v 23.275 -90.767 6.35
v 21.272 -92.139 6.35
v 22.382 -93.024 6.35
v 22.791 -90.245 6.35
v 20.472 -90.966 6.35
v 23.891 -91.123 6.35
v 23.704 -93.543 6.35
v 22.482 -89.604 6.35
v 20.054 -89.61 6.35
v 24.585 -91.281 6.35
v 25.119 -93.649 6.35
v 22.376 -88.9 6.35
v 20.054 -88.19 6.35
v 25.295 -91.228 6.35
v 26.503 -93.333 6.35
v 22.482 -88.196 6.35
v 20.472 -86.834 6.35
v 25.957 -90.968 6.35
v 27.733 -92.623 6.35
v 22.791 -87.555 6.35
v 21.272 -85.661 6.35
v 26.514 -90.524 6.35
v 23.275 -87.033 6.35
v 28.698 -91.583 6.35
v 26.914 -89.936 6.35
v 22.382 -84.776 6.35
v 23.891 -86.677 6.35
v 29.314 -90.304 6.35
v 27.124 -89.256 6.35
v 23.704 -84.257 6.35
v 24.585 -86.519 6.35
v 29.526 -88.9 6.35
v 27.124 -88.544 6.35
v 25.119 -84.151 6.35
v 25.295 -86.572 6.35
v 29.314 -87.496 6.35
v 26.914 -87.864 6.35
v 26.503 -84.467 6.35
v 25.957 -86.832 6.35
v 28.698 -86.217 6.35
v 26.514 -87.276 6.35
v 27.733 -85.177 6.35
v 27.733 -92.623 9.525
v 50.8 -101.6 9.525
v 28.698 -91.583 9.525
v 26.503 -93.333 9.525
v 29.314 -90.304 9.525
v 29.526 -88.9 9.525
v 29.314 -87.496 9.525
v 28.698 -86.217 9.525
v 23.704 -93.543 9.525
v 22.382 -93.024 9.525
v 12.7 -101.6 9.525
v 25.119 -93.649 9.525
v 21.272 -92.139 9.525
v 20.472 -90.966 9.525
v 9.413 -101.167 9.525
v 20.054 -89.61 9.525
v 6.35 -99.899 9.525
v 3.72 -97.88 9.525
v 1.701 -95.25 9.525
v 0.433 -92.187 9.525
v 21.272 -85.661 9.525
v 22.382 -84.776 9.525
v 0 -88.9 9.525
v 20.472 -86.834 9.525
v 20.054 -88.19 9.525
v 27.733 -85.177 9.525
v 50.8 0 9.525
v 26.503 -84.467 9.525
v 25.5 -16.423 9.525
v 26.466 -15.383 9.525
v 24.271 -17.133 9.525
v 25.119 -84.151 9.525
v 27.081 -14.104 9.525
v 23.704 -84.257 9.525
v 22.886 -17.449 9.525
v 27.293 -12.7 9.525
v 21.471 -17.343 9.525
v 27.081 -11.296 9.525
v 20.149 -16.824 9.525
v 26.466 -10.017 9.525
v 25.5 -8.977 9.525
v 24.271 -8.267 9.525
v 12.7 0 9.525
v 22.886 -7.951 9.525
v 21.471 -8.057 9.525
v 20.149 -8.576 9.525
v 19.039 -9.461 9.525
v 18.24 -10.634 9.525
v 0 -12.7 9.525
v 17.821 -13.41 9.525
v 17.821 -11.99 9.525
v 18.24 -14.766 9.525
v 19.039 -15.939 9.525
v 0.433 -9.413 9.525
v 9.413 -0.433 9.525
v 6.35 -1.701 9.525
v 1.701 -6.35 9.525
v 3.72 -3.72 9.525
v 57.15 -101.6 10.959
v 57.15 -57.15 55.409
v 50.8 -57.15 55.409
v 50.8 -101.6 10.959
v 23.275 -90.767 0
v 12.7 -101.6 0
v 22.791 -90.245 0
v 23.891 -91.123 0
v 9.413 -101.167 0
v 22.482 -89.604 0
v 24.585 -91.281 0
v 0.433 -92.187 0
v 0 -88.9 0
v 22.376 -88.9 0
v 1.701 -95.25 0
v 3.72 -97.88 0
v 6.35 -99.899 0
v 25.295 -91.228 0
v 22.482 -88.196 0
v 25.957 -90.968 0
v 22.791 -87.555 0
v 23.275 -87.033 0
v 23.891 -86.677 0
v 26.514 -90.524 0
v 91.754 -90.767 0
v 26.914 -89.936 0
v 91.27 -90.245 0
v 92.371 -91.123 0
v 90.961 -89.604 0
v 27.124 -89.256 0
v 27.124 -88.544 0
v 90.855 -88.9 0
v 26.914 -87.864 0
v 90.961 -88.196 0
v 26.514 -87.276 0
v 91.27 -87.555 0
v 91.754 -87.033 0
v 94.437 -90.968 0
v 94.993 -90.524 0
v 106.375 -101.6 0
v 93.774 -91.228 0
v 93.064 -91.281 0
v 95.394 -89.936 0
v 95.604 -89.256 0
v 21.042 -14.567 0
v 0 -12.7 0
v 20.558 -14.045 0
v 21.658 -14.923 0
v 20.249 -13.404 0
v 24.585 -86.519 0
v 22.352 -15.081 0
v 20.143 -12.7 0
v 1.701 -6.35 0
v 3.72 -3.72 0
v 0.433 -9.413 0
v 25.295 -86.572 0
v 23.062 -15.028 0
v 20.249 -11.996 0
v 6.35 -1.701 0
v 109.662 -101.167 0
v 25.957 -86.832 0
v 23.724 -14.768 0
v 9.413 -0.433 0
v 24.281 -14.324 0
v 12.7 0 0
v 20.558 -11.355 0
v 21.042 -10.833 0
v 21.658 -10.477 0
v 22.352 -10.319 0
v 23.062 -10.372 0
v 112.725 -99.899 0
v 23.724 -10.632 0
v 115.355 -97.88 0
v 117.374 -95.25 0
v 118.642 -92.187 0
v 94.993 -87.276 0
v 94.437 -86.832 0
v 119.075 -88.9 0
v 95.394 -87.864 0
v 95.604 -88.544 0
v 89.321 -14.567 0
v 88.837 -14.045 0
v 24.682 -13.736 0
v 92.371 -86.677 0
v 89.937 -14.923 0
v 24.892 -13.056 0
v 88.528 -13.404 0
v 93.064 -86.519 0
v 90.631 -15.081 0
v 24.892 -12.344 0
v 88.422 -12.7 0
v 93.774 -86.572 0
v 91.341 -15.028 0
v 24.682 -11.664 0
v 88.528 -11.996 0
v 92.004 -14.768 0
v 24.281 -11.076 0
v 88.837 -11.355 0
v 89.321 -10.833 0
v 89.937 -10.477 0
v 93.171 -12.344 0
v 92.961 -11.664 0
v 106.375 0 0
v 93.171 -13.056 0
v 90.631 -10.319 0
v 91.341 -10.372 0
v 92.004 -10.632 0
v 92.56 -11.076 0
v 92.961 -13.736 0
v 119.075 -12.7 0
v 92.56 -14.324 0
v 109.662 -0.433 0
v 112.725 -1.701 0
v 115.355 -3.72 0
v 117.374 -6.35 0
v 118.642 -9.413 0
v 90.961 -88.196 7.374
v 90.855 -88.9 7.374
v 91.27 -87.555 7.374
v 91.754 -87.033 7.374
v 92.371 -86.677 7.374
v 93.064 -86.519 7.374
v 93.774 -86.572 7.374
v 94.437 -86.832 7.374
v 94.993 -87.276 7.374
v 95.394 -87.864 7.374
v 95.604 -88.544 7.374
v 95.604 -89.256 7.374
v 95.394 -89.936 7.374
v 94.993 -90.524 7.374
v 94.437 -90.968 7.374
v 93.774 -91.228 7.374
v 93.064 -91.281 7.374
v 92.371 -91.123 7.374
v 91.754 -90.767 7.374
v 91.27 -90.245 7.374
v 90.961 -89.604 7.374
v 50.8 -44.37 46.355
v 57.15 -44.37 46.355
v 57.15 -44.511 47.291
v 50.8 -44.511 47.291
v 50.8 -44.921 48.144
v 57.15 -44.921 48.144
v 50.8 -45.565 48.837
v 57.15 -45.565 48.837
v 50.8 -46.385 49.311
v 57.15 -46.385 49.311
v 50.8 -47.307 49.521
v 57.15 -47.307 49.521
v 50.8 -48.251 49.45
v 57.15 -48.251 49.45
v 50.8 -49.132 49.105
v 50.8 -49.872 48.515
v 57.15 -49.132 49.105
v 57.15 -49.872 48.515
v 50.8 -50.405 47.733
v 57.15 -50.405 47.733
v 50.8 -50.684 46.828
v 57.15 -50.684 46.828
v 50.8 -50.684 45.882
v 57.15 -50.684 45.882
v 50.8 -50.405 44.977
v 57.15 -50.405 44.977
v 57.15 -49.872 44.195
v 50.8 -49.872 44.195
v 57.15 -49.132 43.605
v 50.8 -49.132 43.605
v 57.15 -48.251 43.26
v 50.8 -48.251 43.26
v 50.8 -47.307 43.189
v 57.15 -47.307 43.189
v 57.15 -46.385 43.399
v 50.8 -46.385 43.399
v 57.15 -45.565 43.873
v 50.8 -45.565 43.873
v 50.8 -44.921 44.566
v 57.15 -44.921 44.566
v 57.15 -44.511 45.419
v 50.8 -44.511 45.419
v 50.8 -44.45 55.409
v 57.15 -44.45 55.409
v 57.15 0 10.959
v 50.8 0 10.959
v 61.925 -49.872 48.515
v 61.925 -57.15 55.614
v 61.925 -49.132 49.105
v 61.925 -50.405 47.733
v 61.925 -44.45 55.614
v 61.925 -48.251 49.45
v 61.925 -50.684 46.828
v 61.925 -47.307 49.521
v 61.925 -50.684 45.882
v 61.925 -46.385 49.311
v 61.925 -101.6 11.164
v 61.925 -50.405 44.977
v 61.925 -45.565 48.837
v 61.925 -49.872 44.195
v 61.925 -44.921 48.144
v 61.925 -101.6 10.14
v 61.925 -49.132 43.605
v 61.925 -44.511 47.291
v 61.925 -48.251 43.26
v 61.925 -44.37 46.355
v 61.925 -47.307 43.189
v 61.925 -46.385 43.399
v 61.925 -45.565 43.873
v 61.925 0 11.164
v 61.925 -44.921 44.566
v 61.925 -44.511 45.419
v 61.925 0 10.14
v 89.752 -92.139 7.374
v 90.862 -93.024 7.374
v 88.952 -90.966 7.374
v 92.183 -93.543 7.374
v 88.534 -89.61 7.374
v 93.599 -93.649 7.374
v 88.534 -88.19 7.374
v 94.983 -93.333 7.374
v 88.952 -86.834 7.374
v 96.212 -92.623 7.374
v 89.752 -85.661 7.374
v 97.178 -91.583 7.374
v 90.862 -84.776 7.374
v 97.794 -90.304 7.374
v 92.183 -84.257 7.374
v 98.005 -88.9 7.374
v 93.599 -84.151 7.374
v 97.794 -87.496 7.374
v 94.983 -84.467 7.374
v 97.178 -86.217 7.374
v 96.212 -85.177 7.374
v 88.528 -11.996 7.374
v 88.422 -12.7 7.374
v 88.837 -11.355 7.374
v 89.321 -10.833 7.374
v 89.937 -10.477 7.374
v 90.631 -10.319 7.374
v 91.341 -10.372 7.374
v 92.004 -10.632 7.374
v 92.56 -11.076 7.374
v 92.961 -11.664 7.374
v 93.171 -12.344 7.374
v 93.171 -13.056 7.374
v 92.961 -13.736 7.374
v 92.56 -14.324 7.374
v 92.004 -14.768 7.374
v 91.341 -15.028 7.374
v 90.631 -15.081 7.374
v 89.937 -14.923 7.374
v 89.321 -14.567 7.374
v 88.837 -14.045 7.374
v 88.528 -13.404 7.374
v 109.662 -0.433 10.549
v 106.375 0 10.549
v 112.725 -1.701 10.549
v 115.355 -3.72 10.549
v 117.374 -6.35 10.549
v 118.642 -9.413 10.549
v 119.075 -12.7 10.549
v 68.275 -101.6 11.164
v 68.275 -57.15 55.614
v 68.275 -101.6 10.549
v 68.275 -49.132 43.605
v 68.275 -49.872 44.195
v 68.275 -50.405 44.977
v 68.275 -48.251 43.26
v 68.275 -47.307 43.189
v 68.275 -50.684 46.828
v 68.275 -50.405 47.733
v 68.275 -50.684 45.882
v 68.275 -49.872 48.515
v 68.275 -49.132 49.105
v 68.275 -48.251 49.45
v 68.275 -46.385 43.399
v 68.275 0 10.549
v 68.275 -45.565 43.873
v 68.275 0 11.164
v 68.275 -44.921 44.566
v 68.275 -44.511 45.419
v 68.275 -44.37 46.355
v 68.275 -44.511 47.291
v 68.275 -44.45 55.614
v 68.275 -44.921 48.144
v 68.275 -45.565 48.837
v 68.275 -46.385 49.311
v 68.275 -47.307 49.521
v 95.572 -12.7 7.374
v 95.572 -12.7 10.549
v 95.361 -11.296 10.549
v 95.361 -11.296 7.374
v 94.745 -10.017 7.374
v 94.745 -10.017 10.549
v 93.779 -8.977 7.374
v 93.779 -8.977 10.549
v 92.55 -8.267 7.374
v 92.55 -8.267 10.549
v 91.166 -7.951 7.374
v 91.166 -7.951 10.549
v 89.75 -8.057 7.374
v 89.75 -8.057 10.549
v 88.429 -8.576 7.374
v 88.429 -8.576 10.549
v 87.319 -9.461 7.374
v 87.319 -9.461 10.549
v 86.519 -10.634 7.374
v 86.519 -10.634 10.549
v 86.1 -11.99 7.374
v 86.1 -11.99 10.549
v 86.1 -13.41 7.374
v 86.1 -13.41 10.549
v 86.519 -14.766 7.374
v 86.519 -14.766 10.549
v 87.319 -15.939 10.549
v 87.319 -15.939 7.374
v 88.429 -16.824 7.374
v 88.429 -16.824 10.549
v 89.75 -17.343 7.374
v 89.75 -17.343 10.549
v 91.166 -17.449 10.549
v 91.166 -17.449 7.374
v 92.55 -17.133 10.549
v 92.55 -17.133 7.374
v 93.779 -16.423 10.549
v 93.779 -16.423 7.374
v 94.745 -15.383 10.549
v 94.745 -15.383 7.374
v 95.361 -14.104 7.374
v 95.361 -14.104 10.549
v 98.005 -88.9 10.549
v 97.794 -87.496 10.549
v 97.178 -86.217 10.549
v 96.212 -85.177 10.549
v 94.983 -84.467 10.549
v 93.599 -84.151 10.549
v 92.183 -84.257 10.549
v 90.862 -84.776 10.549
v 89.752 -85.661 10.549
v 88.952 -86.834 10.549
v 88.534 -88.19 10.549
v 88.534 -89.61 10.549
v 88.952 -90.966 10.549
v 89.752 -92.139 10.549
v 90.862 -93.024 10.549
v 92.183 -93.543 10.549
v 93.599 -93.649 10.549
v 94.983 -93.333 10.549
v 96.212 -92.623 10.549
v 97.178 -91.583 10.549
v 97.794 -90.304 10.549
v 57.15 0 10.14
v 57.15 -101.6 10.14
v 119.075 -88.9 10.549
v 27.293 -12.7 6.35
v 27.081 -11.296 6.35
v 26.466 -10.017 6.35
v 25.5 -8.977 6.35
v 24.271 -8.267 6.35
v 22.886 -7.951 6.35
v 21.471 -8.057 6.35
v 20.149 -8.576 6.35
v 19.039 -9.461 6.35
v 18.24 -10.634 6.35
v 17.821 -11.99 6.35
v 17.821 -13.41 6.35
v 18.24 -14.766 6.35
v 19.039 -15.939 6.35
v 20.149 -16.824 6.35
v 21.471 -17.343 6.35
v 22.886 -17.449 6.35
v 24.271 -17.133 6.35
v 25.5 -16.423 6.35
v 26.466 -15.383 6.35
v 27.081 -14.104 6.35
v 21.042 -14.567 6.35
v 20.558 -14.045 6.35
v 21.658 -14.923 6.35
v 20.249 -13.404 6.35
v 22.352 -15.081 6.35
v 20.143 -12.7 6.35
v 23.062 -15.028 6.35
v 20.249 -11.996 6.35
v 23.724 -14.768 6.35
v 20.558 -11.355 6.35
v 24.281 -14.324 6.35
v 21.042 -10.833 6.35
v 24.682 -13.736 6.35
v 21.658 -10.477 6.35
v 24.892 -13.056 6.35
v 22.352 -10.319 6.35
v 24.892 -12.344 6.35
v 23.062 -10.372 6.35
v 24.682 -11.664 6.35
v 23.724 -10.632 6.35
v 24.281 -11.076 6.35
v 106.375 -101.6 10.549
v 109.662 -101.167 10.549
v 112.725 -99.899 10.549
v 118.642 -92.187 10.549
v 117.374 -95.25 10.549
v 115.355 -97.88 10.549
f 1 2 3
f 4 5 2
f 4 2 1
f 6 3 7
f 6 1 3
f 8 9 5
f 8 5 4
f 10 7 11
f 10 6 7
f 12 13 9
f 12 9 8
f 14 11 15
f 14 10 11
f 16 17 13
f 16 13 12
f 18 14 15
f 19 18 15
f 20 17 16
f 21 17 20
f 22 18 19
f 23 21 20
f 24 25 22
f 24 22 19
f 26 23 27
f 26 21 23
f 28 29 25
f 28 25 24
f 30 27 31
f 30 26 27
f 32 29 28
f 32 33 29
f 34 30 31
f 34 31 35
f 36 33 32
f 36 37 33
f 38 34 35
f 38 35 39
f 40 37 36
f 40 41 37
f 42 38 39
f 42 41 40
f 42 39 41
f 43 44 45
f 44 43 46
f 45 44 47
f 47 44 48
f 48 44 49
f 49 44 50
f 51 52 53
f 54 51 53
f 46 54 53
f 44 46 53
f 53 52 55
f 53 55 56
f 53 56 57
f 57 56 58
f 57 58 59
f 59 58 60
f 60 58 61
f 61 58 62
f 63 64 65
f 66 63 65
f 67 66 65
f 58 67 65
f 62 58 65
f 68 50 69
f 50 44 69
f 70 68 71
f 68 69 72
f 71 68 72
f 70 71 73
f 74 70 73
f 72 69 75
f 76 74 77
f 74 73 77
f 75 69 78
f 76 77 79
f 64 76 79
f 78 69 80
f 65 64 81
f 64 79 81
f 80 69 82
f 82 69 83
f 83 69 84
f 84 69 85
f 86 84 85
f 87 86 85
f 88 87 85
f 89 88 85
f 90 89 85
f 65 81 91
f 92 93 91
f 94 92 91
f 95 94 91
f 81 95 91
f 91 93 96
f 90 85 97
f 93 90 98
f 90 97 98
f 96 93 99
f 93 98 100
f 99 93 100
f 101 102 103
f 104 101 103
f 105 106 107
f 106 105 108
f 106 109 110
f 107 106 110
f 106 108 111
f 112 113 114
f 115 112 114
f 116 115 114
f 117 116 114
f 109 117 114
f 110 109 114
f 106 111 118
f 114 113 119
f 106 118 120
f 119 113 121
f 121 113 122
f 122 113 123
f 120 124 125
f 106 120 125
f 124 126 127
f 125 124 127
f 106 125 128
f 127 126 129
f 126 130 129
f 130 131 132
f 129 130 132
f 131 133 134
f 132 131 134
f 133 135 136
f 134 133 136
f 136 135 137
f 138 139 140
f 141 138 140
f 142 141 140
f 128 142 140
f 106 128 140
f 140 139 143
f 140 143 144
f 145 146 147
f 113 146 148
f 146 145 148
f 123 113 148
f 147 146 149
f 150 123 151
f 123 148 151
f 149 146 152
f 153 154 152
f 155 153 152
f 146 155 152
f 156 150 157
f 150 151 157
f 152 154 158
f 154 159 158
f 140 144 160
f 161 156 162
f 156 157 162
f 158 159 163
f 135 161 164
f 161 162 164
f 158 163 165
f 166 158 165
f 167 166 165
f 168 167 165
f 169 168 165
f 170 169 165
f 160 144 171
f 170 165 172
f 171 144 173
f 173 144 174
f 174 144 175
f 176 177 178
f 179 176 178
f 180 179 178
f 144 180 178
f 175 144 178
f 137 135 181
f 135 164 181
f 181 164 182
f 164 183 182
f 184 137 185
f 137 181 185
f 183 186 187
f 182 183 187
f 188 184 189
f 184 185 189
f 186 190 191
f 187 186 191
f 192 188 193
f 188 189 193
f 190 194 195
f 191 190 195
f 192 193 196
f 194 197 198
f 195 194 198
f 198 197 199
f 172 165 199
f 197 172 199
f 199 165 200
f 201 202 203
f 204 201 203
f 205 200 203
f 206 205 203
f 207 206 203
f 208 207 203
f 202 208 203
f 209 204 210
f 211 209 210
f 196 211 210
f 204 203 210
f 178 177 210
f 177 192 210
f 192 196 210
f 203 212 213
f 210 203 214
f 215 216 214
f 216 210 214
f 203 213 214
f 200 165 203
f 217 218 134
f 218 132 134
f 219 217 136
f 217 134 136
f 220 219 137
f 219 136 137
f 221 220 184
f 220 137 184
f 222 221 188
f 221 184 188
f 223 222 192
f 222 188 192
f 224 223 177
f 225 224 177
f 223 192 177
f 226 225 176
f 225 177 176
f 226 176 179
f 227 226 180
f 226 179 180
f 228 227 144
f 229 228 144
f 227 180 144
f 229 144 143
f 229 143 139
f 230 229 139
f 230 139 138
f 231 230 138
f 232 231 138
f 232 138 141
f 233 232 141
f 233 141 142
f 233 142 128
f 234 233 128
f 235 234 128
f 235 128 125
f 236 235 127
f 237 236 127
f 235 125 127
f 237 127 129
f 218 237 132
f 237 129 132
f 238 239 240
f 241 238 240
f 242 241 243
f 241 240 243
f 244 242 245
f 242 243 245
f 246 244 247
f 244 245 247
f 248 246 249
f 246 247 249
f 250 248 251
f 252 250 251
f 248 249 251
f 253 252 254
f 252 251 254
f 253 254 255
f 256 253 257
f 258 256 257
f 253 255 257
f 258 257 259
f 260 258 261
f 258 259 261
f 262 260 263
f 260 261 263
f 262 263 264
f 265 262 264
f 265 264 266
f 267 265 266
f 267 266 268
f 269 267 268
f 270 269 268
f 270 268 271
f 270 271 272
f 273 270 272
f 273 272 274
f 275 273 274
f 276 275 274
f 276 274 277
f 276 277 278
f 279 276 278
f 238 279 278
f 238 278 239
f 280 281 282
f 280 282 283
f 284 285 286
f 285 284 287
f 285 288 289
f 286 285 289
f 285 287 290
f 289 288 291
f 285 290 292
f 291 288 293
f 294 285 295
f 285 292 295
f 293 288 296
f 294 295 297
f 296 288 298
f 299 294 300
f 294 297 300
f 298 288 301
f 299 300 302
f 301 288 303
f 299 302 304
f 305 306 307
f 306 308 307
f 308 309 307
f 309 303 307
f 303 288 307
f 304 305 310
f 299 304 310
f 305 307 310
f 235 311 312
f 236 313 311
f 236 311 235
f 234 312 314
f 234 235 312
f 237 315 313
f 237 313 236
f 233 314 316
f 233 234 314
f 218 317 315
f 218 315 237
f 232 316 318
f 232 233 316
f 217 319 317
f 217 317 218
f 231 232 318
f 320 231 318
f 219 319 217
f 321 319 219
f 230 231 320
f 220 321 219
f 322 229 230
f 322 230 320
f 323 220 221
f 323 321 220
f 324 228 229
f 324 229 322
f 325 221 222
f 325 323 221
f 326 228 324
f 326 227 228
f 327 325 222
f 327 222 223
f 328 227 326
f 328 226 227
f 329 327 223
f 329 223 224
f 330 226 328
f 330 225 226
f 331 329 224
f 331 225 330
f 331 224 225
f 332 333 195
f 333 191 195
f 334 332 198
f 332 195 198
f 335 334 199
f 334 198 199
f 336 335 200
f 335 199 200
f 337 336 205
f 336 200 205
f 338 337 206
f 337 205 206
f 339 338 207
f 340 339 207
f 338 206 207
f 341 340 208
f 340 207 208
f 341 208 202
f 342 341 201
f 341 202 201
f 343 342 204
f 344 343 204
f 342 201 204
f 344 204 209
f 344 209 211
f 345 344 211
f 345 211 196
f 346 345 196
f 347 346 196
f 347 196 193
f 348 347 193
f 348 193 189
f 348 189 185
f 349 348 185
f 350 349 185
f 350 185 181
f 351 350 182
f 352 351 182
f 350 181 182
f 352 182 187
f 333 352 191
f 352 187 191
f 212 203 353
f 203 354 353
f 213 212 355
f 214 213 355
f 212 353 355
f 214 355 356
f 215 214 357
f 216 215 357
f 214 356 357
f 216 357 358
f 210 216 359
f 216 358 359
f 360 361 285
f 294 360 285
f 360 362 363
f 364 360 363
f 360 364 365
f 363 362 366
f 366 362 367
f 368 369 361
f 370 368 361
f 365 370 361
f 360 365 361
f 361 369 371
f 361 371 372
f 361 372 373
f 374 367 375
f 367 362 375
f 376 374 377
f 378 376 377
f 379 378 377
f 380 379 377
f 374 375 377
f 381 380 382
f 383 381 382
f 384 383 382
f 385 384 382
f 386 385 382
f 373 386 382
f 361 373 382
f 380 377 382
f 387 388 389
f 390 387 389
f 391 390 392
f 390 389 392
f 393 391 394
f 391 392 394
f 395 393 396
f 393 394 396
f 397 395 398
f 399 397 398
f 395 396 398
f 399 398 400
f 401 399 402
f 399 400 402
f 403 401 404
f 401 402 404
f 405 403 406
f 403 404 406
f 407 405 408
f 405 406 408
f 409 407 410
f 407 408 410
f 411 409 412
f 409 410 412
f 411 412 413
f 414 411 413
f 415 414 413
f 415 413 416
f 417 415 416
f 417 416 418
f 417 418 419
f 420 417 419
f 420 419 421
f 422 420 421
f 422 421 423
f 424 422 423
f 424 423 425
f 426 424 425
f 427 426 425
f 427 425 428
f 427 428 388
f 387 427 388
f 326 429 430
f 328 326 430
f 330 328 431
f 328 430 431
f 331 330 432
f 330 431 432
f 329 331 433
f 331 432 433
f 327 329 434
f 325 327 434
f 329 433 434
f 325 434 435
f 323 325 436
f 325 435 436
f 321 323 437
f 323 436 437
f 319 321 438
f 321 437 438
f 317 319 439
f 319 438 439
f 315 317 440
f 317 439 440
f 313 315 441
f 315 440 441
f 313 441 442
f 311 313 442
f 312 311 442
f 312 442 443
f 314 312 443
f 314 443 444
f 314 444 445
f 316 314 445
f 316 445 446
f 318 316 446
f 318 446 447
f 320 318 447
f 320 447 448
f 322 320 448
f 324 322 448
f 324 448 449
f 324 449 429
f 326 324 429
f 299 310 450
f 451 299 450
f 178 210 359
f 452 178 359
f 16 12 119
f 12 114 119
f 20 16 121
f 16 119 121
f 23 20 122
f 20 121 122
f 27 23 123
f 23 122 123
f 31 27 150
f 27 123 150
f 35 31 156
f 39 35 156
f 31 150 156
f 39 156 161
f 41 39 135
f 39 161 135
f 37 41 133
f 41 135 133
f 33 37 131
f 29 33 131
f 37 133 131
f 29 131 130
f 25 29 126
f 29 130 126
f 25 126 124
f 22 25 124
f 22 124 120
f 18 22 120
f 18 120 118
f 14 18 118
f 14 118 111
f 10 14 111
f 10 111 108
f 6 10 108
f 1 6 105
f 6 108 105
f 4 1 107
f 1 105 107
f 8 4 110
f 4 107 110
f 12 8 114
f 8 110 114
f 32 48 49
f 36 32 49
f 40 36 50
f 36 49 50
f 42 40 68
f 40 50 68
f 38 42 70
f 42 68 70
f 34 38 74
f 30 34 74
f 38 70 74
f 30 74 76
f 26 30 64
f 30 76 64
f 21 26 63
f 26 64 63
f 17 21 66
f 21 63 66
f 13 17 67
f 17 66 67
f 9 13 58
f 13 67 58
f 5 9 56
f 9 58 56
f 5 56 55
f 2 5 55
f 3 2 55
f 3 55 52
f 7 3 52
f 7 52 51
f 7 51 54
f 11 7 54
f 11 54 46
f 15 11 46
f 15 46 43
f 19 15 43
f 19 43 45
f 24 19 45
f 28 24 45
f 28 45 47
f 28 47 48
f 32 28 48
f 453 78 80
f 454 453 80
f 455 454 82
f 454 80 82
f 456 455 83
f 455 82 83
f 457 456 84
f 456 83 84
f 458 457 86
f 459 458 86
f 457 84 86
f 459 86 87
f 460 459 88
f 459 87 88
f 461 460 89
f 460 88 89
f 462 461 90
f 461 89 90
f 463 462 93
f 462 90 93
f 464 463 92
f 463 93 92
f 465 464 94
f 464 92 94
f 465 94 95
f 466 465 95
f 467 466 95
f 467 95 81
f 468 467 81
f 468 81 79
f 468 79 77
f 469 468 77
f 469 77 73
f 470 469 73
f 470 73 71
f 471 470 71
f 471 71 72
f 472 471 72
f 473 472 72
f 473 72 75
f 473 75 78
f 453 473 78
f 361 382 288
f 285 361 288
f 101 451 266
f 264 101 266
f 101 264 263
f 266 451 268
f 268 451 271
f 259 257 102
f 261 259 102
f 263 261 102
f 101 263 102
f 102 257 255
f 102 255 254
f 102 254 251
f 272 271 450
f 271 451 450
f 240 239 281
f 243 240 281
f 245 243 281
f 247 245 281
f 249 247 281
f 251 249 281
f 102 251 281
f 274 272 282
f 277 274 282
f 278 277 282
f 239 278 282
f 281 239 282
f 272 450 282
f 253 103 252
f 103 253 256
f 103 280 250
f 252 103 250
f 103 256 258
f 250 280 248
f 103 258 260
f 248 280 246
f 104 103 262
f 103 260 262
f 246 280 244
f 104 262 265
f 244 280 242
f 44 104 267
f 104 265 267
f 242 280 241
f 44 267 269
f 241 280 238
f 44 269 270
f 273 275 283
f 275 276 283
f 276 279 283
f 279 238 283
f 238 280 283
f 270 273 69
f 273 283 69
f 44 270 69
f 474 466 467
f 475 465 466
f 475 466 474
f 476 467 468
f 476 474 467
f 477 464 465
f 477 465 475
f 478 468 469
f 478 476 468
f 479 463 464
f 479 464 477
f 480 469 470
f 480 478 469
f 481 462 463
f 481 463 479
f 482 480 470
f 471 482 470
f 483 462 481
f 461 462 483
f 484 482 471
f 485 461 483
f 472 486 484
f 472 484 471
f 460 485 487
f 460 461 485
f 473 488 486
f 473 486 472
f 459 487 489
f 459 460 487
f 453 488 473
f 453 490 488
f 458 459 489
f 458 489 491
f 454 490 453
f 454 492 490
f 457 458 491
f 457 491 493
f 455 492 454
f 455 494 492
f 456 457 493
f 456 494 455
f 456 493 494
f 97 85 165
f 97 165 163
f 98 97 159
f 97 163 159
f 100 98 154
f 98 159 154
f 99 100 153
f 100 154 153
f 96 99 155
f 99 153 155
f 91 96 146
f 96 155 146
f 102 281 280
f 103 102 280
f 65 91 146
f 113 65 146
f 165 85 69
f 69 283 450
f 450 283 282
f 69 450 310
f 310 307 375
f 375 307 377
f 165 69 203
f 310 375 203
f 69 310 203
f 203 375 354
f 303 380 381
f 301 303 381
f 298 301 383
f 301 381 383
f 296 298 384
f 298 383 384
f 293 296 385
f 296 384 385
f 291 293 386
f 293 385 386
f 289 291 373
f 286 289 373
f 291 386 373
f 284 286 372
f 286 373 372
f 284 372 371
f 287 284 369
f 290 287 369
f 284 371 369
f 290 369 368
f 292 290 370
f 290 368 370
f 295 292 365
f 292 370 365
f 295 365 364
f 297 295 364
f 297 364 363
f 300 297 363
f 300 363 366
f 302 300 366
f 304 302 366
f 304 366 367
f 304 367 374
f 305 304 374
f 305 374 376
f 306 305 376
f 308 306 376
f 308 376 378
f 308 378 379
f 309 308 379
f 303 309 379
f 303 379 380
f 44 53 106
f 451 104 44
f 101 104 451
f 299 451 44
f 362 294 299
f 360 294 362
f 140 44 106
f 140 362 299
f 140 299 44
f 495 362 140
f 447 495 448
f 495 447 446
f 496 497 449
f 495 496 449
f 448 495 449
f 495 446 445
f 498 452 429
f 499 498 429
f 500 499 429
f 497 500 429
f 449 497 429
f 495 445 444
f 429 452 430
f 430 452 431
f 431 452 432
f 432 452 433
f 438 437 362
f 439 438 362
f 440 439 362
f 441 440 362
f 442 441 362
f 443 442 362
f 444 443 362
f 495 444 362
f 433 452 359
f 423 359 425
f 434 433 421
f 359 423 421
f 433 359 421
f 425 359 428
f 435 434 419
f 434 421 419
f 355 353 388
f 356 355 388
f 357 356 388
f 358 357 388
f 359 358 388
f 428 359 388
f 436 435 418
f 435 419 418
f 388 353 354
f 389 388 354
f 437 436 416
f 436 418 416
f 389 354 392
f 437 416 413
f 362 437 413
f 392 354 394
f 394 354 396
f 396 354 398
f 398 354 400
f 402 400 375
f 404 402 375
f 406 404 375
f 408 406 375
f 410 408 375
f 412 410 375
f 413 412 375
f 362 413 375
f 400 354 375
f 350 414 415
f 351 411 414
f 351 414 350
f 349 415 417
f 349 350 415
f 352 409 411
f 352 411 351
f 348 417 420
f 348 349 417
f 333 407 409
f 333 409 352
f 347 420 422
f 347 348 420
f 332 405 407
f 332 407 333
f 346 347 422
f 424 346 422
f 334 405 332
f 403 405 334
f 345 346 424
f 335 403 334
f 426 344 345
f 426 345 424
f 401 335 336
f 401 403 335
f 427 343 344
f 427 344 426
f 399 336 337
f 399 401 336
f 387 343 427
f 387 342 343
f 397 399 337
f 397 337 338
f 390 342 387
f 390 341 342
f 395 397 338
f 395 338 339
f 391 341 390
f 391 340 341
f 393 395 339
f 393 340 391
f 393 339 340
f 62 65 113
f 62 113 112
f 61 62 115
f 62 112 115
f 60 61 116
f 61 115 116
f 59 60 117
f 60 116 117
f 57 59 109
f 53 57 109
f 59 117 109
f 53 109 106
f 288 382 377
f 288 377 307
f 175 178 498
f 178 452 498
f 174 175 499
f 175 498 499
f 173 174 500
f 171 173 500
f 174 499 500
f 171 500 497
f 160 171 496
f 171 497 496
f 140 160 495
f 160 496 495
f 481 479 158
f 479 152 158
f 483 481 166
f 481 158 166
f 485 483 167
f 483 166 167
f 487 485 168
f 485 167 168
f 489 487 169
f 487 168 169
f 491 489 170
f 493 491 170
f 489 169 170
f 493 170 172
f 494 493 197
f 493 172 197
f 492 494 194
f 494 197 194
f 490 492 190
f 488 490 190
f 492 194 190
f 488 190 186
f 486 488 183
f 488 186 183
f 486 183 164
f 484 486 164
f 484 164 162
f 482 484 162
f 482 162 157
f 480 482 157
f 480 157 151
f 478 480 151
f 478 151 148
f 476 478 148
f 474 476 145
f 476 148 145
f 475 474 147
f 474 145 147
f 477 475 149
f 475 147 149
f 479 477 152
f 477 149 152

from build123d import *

# Parameters (mm, degrees)
F1_DEPTH       = 101.6
F3_D           = 4.7752
F3_CBORE_D     = 9.525
F3_CBORE_DEPTH = 3.175
F5_D           = 4.7752
F5_CBORE_D     = 9.525
F5_CBORE_DEPTH = 3.175
F7_D           = 6.35
F8_SIZE        = 44.45
F9_R           = 12.7


with BuildPart() as f1:
    # F0 (on Front) → F1 (new body)
    with BuildSketch(Plane.XZ):
        Polygon((0, 9.525), (0, 0), (119.0752, 0), (119.0752, 10.549193), (68.2752, 10.549193), (68.2752, 55.613711), (61.9252, 55.613711), (61.9252, 10.139516), (57.15, 10.139516), (57.15, 55.40887), (50.8, 55.40887), (50.8, 9.525), align=None)
    extrude(amount=F1_DEPTH)

    # F3 (through all)
    with Locations(Plane.XY.offset(9.525)):
        with Locations((22.530584, -12.7), (24.763316, -88.9)):
            CounterBoreHole(F3_D / 2, F3_CBORE_D / 2, F3_CBORE_DEPTH)

    # F5 (through all)
    with Locations(Plane.XY.offset(10.549193)):
        with Locations((90.809768, -12.7), (93.242841, -88.9)):
            CounterBoreHole(F5_D / 2, F5_CBORE_D / 2, F5_CBORE_DEPTH)

    # F7 (through all)
    with Locations(Plane(origin=(50.8, 0, 0), x_dir=(0, -1, 0), z_dir=(-1, 0, 0))):
        with Locations((47.544591, 46.355)):
            Hole(F7_D / 2)

    # F8
    f8_edges = [f1.edges().sort_by_distance(p)[0] for p in [
        (53.975, 0, 55.40887),
        (53.975, -101.6, 55.40887),
        (65.1002, -101.6, 55.613711),
        (65.1002, 0, 55.613711),
    ]]
    chamfer(f8_edges, length=F8_SIZE)

    # F9
    f9_edges = [f1.edges().sort_by_distance(p)[0] for p in [
        (0, 0, 4.7625),
        (0, -101.6, 4.7625),
        (119.0752, -101.6, 5.274597),
        (119.0752, 0, 5.274597),
    ]]
    fillet(f9_edges, radius=F9_R)


solid = f1.part
